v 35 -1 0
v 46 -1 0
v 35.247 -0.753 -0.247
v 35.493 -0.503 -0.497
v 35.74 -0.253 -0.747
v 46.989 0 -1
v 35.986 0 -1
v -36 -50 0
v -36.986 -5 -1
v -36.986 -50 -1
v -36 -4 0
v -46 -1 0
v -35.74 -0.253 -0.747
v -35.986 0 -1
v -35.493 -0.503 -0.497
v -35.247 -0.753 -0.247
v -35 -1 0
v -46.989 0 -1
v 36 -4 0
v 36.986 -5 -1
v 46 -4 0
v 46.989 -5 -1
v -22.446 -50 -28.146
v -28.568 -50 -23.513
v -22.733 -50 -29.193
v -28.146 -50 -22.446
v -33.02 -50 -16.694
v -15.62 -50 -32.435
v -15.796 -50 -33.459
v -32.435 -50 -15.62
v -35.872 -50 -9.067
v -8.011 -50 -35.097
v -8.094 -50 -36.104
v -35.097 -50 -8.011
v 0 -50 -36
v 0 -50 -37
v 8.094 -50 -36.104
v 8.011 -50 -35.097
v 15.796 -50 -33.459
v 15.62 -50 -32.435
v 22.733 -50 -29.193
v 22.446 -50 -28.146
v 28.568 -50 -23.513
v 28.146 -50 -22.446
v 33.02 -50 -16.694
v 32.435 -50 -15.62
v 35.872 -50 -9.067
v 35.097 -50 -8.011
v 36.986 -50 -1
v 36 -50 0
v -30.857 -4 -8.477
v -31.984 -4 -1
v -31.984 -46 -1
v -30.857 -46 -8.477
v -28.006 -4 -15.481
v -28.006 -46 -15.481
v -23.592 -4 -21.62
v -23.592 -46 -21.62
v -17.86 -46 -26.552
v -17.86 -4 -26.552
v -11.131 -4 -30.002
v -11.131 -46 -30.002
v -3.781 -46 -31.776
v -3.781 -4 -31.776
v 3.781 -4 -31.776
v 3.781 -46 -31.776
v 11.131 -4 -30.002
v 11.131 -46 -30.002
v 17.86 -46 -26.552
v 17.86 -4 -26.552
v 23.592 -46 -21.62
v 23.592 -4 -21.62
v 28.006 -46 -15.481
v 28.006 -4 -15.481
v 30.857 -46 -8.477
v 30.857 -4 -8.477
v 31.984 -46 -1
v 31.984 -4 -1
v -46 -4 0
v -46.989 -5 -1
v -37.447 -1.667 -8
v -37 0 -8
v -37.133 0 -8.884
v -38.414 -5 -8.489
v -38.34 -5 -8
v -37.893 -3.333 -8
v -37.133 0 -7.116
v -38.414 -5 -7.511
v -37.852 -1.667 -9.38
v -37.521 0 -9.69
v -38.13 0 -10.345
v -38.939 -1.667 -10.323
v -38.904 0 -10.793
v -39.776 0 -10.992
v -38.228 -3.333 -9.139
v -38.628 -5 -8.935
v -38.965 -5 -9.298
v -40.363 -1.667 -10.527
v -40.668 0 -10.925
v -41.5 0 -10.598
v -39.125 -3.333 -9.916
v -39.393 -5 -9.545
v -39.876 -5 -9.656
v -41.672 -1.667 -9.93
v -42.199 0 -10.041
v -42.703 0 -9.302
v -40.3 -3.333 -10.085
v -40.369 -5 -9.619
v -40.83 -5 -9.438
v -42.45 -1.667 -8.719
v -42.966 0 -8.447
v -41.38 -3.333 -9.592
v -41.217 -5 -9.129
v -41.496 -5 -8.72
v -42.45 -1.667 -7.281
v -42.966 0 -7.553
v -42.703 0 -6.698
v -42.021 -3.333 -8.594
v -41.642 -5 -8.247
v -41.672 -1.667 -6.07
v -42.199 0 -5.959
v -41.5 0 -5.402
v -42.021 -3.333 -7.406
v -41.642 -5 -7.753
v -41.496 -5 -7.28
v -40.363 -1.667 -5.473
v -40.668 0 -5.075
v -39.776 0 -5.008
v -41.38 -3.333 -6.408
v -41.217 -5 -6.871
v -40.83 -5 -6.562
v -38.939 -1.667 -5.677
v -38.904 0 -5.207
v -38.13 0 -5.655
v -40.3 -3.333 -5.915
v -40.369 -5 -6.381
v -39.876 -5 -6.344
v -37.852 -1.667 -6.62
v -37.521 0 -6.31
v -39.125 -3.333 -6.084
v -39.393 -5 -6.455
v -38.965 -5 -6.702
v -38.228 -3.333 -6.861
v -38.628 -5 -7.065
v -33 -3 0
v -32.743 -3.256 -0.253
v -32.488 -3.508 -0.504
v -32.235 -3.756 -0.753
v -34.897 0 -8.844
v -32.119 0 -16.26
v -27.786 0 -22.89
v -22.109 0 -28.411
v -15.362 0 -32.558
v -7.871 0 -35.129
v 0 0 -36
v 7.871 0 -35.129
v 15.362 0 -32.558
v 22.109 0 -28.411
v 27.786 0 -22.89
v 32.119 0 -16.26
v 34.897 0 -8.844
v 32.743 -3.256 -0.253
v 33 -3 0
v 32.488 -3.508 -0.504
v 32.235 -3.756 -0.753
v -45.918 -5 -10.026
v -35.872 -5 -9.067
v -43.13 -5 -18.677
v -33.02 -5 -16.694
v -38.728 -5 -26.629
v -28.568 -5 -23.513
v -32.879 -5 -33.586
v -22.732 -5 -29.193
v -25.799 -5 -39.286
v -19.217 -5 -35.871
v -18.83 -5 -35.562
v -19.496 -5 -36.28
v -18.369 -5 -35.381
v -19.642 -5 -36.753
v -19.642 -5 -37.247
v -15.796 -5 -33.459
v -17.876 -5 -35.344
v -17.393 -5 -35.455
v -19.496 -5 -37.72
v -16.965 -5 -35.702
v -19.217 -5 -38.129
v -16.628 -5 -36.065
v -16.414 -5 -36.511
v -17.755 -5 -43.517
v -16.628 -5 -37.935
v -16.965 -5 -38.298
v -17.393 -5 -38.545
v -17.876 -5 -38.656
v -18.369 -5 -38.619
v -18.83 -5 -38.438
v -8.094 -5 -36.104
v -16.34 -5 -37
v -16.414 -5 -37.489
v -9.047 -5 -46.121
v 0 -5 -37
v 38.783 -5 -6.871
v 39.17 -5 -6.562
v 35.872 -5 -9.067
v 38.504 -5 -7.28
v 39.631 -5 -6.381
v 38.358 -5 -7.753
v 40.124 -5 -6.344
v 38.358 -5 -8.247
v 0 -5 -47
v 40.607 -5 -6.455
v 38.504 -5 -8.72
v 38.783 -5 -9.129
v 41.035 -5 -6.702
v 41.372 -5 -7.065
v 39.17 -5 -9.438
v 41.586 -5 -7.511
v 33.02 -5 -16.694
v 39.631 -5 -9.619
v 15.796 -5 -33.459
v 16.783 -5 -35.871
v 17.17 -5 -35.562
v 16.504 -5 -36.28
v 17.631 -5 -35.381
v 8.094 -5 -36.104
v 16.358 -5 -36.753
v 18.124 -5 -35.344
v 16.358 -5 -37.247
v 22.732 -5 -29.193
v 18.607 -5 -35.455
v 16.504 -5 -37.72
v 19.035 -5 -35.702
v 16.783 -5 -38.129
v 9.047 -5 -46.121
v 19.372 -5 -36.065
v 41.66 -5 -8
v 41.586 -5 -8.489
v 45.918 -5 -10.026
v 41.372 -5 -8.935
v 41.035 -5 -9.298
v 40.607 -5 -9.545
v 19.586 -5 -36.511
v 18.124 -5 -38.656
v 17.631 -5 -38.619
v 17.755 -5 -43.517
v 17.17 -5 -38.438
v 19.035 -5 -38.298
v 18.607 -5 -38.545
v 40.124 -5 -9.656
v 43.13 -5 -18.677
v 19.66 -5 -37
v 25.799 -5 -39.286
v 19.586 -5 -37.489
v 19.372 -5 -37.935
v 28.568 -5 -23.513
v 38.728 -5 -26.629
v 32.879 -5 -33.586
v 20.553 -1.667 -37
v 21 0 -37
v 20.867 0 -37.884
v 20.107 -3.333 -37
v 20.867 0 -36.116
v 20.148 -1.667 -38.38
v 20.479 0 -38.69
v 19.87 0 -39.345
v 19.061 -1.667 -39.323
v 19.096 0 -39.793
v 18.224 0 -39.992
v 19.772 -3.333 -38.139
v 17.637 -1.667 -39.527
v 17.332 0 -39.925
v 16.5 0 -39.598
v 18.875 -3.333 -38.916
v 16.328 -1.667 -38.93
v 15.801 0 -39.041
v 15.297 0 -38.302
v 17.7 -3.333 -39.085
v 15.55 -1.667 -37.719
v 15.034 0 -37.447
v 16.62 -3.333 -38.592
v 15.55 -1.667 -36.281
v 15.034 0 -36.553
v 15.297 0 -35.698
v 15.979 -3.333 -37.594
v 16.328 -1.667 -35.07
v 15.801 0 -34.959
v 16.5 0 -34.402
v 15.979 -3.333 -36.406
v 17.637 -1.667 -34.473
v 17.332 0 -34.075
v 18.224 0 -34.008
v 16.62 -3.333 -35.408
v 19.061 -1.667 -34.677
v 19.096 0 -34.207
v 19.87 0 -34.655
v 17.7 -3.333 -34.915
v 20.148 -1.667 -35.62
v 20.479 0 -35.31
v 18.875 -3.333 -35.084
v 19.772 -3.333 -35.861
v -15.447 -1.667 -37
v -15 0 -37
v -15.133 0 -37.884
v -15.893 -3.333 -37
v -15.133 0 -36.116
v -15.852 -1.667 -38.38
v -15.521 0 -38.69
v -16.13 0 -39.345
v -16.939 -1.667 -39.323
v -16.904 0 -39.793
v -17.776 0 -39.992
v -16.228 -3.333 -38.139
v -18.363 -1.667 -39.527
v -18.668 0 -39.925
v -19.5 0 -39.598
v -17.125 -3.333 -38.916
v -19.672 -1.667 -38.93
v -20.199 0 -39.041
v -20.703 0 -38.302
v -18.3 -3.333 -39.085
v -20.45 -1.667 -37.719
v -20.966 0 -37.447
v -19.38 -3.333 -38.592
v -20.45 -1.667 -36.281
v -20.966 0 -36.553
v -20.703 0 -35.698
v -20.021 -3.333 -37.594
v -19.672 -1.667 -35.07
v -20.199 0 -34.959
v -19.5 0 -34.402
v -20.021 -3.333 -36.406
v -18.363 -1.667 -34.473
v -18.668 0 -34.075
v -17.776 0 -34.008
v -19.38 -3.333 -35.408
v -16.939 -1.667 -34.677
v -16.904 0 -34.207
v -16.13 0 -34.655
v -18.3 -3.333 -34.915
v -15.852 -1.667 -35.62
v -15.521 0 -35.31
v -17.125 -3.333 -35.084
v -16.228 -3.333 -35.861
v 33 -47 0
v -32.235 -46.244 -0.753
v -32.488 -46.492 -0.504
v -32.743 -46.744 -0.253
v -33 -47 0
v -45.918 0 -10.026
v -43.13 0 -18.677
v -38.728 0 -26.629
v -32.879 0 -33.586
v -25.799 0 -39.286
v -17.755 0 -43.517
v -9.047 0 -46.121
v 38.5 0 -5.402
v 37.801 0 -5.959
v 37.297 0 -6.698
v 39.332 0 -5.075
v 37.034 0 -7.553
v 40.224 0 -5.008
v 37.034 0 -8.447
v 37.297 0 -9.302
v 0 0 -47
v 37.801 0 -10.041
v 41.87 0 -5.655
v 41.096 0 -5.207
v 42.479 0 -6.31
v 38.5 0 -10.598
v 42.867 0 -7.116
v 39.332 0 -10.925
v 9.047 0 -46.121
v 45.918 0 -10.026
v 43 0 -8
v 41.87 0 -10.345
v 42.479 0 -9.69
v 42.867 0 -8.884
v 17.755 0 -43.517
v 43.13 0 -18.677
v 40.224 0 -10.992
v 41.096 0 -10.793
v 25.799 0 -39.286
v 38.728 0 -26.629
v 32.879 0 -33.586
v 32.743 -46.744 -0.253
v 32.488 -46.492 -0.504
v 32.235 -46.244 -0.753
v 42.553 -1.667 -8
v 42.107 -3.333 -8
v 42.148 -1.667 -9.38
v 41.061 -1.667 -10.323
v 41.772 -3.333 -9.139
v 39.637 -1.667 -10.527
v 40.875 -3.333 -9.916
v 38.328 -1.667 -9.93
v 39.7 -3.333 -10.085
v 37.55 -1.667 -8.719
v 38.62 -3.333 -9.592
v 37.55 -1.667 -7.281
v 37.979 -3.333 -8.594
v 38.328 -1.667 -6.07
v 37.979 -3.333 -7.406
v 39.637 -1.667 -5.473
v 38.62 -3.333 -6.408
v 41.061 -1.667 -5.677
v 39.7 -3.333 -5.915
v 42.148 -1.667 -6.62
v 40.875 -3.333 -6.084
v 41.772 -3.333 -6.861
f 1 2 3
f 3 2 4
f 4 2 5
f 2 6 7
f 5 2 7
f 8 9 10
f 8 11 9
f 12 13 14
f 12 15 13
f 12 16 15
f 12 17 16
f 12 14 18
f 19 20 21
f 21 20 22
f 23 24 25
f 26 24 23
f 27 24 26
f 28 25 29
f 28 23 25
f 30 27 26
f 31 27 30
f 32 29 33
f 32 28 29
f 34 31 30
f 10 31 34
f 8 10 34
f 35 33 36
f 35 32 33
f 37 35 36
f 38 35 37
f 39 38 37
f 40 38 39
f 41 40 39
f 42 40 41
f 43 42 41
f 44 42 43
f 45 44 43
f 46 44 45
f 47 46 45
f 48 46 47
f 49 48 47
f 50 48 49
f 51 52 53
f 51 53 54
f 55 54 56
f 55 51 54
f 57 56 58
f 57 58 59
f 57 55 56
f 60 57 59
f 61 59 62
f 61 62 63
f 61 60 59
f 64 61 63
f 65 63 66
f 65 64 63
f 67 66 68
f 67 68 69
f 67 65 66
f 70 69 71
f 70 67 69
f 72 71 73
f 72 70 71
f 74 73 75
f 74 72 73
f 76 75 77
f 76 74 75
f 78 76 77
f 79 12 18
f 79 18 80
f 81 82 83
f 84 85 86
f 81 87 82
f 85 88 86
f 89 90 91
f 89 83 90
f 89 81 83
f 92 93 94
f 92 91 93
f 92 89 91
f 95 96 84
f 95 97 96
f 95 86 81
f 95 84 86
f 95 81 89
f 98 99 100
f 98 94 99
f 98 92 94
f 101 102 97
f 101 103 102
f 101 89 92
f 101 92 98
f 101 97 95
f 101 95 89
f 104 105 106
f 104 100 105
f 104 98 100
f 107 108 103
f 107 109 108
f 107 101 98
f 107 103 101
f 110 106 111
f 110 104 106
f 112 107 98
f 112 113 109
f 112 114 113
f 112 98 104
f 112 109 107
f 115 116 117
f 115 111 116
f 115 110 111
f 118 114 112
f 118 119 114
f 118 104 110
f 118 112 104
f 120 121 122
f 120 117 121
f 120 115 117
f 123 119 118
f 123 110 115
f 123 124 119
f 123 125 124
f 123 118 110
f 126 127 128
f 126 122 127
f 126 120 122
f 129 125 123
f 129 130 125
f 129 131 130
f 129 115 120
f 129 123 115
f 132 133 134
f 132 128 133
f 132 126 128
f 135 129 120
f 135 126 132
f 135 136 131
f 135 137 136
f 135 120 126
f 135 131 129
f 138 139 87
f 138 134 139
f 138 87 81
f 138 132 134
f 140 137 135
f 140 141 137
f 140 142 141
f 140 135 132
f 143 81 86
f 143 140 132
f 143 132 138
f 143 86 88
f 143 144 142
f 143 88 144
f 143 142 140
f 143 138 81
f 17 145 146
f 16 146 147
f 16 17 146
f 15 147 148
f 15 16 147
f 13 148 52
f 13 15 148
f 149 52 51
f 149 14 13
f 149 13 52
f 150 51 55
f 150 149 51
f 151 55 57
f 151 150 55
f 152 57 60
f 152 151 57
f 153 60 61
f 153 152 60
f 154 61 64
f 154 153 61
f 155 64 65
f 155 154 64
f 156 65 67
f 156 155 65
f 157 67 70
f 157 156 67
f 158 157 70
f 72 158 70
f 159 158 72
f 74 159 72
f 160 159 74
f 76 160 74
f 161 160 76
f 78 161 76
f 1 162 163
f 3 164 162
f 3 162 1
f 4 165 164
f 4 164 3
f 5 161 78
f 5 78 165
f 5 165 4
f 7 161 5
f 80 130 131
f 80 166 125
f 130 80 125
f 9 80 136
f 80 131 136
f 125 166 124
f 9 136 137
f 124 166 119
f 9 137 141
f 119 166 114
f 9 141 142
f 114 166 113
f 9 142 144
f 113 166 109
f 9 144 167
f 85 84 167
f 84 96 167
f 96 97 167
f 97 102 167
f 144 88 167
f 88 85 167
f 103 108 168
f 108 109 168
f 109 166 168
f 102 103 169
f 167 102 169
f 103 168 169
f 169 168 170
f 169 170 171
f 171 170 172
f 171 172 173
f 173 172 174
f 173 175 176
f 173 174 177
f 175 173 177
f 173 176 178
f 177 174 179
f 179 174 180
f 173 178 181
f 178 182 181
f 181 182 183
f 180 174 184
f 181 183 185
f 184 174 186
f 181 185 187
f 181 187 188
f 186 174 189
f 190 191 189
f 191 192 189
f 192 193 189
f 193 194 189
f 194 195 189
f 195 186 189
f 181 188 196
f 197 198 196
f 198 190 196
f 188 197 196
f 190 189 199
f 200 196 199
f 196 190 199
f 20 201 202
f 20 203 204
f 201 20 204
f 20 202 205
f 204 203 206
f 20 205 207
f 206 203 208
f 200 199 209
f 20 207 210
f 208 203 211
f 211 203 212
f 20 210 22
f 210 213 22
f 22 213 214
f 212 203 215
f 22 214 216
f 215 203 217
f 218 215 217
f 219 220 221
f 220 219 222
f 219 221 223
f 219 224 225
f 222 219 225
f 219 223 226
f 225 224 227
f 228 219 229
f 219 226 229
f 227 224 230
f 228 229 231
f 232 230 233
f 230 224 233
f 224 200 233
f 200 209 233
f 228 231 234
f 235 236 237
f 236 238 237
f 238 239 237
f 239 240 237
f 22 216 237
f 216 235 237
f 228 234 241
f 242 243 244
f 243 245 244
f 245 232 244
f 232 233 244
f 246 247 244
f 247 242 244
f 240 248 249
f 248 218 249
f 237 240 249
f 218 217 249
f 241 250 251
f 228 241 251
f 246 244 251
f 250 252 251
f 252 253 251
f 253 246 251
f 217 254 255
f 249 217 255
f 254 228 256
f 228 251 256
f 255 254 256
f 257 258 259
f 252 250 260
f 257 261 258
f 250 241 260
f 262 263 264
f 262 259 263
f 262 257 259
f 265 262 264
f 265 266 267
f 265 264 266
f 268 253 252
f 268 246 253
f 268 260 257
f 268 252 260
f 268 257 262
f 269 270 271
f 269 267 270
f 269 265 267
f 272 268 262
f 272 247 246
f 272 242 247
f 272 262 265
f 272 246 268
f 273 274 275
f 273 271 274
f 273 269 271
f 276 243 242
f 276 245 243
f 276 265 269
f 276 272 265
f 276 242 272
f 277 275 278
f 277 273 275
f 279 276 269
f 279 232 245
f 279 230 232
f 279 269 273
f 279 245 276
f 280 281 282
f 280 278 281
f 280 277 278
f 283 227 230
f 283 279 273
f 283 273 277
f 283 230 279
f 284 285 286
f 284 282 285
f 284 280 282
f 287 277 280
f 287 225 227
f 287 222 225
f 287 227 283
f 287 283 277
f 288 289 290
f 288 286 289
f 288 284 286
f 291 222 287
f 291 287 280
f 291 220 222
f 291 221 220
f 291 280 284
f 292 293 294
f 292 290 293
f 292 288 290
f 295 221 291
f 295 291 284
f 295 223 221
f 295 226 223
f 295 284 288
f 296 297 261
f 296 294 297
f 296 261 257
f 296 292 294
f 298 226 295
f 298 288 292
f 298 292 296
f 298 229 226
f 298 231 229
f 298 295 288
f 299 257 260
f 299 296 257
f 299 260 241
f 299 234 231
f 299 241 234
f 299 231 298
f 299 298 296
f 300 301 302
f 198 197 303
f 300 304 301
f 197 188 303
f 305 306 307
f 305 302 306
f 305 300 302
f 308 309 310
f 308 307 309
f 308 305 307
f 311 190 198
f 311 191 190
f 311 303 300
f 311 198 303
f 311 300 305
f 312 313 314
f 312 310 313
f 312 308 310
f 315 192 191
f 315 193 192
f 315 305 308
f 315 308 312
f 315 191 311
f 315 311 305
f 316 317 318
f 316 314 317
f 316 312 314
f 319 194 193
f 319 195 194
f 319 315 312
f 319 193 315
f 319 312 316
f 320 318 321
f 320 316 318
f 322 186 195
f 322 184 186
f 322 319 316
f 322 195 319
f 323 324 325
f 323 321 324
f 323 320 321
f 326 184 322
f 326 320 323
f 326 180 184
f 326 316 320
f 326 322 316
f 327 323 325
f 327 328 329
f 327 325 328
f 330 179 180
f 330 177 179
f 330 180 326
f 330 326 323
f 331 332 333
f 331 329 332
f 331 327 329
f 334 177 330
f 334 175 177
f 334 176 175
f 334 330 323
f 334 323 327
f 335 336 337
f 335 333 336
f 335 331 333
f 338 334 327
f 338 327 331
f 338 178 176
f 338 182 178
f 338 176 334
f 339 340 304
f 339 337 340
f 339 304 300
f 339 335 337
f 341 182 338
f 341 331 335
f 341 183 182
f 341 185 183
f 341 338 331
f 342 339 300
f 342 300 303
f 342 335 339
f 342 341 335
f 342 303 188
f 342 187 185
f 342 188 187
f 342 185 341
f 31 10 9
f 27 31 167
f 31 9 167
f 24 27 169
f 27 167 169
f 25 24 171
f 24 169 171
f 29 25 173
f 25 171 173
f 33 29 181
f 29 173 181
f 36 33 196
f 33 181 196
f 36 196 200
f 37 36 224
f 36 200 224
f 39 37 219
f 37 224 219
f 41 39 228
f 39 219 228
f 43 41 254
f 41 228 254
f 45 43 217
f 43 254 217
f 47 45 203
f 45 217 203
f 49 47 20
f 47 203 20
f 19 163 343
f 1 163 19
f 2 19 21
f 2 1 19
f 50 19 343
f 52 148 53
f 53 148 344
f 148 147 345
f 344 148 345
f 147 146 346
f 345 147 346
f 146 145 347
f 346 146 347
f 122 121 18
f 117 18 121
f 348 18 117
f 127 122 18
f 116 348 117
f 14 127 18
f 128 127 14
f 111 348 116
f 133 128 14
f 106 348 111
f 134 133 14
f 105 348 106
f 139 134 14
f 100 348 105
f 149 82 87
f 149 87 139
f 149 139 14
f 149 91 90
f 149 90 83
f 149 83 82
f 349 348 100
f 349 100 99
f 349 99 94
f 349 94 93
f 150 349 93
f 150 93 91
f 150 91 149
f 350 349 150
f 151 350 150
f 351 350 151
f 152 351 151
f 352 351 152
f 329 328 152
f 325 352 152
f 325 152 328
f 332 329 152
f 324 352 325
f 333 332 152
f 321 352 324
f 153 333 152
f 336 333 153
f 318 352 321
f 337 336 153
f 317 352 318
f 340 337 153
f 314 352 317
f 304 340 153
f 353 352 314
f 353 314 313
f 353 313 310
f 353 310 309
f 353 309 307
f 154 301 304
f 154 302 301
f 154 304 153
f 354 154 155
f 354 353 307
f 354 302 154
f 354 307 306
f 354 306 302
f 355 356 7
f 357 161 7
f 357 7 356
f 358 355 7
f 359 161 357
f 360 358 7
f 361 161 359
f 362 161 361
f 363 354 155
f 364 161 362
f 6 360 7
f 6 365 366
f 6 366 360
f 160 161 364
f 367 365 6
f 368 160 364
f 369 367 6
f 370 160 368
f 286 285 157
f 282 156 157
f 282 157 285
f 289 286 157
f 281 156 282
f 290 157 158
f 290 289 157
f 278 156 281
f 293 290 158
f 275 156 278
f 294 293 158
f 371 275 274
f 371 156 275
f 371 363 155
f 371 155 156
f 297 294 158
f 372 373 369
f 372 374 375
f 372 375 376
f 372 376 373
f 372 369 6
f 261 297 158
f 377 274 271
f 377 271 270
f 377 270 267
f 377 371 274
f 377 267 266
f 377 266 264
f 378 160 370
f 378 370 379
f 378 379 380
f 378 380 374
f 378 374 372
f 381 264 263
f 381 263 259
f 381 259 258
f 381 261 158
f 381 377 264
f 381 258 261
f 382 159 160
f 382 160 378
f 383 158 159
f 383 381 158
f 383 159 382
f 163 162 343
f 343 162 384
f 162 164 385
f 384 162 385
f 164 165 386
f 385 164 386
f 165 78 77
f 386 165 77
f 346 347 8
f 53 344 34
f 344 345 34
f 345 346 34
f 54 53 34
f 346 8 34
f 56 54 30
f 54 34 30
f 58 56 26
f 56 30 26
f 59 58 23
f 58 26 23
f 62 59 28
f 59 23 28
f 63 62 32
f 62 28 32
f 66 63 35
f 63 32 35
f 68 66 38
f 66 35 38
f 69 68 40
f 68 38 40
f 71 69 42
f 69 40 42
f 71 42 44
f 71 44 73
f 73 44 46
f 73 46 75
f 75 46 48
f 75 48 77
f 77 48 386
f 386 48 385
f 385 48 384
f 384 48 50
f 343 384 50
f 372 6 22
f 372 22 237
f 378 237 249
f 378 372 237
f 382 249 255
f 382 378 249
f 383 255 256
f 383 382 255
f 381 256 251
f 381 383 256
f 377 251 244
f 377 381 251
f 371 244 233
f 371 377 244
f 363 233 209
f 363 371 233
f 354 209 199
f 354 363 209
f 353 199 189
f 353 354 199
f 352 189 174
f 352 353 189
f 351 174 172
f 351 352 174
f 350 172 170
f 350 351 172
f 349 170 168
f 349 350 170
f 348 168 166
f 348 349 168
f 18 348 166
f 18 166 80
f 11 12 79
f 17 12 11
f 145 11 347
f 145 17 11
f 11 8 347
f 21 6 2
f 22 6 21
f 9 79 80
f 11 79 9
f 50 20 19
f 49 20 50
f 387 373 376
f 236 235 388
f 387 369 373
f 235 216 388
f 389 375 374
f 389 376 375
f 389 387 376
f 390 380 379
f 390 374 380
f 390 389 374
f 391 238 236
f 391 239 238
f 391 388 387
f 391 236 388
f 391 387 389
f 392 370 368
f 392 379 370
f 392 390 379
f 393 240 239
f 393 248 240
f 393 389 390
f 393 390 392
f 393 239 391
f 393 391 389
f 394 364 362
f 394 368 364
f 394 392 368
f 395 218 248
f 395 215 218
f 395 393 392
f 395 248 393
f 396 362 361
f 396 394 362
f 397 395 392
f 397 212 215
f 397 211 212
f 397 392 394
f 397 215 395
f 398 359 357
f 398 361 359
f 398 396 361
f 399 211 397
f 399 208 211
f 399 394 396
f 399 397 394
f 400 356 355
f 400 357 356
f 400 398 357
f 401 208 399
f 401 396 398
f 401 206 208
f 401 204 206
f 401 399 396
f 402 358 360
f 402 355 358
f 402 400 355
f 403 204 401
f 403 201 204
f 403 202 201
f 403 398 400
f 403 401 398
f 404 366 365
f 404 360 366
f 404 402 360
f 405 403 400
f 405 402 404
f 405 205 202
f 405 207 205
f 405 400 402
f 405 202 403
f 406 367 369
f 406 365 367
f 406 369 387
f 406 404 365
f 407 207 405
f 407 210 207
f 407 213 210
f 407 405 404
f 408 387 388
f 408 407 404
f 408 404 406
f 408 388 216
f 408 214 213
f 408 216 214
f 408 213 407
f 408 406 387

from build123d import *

# Parameters (mm, degrees)
PAD_DEPTH       = 50
PAD001_DEPTH    = 5
SKETCH003_R     = 3
POCKET_DEPTH    = 5
POCKET_TAPER    = 15
CHAMFER_SIZE    = 4
CHAMFER001_SIZE = 4
CHAMFER002_SIZE = 1


with BuildPart() as part:
    # Sketch → Pad (new body)
    with BuildSketch(Plane.XZ):
        with BuildLine():
            ThreePointArc((-37, 0), (0, -37), (37, 0))
            Line((32, 0), (37, 0))
            ThreePointArc((-32, 0), (0, -32), (32, 0))
            Line((-37, 0), (-32, 0))
        make_face()
    extrude(amount=PAD_DEPTH)

    # Sketch002 (on Face5 of Pad) → Pad001 (join)
    with BuildSketch(Plane(origin=(0, 0, 0), x_dir=(1, 0, 0), z_dir=(0, 1, 0))):
        with BuildLine():
            ThreePointArc((47, 0), (0, 47), (-47, 0))
            Line((-47, 0), (-37, 0))
            ThreePointArc((37, 0), (0, 37), (-37, 0))
            Line((37, 0), (47, 0))
        make_face()
    extrude(amount=-PAD001_DEPTH)

    # Sketch003 (on Face8 of Pad001) → Pocket (cut)
    with BuildSketch(Plane(origin=(0, 0, 0), x_dir=(1, 0, 0), z_dir=(0, 1, 0))):
        with Locations((-40, 8)):
            Circle(SKETCH003_R)
        with Locations((-18, 37)):
            Circle(SKETCH003_R)
        with Locations((18, 37)):
            Circle(SKETCH003_R)
        with Locations((40, 8)):
            Circle(SKETCH003_R)
    extrude(amount=-POCKET_DEPTH, taper=POCKET_TAPER, mode=Mode.SUBTRACT)

    # Chamfer
    chamfer_edges = [part.edges().sort_by_distance(p)[0] for p in [
        (0, -50, -32),
    ]]
    chamfer(chamfer_edges, length=CHAMFER_SIZE)

    # Chamfer001
    chamfer001_edges = [part.edges().sort_by_distance(p)[0] for p in [
        (0, 0, -32),
    ]]
    chamfer(chamfer001_edges, length=CHAMFER001_SIZE)

    # Chamfer002
    chamfer002_edges = [part.edges().sort_by_distance(p)[0] for p in [
        (-42, -5, 0),
        (-41.5, 0, 0),
        (-47, -2.5, 0),
        (-37, -27.5, 0),
        (-32, -25, 0),
        (42, -5, 0),
        (47, -2.5, 0),
        (41.5, 0, 0),
        (37, -27.5, 0),
        (32, -25, 0),
    ]]
    chamfer(chamfer002_edges, length=CHAMFER002_SIZE)


solid = part.part
